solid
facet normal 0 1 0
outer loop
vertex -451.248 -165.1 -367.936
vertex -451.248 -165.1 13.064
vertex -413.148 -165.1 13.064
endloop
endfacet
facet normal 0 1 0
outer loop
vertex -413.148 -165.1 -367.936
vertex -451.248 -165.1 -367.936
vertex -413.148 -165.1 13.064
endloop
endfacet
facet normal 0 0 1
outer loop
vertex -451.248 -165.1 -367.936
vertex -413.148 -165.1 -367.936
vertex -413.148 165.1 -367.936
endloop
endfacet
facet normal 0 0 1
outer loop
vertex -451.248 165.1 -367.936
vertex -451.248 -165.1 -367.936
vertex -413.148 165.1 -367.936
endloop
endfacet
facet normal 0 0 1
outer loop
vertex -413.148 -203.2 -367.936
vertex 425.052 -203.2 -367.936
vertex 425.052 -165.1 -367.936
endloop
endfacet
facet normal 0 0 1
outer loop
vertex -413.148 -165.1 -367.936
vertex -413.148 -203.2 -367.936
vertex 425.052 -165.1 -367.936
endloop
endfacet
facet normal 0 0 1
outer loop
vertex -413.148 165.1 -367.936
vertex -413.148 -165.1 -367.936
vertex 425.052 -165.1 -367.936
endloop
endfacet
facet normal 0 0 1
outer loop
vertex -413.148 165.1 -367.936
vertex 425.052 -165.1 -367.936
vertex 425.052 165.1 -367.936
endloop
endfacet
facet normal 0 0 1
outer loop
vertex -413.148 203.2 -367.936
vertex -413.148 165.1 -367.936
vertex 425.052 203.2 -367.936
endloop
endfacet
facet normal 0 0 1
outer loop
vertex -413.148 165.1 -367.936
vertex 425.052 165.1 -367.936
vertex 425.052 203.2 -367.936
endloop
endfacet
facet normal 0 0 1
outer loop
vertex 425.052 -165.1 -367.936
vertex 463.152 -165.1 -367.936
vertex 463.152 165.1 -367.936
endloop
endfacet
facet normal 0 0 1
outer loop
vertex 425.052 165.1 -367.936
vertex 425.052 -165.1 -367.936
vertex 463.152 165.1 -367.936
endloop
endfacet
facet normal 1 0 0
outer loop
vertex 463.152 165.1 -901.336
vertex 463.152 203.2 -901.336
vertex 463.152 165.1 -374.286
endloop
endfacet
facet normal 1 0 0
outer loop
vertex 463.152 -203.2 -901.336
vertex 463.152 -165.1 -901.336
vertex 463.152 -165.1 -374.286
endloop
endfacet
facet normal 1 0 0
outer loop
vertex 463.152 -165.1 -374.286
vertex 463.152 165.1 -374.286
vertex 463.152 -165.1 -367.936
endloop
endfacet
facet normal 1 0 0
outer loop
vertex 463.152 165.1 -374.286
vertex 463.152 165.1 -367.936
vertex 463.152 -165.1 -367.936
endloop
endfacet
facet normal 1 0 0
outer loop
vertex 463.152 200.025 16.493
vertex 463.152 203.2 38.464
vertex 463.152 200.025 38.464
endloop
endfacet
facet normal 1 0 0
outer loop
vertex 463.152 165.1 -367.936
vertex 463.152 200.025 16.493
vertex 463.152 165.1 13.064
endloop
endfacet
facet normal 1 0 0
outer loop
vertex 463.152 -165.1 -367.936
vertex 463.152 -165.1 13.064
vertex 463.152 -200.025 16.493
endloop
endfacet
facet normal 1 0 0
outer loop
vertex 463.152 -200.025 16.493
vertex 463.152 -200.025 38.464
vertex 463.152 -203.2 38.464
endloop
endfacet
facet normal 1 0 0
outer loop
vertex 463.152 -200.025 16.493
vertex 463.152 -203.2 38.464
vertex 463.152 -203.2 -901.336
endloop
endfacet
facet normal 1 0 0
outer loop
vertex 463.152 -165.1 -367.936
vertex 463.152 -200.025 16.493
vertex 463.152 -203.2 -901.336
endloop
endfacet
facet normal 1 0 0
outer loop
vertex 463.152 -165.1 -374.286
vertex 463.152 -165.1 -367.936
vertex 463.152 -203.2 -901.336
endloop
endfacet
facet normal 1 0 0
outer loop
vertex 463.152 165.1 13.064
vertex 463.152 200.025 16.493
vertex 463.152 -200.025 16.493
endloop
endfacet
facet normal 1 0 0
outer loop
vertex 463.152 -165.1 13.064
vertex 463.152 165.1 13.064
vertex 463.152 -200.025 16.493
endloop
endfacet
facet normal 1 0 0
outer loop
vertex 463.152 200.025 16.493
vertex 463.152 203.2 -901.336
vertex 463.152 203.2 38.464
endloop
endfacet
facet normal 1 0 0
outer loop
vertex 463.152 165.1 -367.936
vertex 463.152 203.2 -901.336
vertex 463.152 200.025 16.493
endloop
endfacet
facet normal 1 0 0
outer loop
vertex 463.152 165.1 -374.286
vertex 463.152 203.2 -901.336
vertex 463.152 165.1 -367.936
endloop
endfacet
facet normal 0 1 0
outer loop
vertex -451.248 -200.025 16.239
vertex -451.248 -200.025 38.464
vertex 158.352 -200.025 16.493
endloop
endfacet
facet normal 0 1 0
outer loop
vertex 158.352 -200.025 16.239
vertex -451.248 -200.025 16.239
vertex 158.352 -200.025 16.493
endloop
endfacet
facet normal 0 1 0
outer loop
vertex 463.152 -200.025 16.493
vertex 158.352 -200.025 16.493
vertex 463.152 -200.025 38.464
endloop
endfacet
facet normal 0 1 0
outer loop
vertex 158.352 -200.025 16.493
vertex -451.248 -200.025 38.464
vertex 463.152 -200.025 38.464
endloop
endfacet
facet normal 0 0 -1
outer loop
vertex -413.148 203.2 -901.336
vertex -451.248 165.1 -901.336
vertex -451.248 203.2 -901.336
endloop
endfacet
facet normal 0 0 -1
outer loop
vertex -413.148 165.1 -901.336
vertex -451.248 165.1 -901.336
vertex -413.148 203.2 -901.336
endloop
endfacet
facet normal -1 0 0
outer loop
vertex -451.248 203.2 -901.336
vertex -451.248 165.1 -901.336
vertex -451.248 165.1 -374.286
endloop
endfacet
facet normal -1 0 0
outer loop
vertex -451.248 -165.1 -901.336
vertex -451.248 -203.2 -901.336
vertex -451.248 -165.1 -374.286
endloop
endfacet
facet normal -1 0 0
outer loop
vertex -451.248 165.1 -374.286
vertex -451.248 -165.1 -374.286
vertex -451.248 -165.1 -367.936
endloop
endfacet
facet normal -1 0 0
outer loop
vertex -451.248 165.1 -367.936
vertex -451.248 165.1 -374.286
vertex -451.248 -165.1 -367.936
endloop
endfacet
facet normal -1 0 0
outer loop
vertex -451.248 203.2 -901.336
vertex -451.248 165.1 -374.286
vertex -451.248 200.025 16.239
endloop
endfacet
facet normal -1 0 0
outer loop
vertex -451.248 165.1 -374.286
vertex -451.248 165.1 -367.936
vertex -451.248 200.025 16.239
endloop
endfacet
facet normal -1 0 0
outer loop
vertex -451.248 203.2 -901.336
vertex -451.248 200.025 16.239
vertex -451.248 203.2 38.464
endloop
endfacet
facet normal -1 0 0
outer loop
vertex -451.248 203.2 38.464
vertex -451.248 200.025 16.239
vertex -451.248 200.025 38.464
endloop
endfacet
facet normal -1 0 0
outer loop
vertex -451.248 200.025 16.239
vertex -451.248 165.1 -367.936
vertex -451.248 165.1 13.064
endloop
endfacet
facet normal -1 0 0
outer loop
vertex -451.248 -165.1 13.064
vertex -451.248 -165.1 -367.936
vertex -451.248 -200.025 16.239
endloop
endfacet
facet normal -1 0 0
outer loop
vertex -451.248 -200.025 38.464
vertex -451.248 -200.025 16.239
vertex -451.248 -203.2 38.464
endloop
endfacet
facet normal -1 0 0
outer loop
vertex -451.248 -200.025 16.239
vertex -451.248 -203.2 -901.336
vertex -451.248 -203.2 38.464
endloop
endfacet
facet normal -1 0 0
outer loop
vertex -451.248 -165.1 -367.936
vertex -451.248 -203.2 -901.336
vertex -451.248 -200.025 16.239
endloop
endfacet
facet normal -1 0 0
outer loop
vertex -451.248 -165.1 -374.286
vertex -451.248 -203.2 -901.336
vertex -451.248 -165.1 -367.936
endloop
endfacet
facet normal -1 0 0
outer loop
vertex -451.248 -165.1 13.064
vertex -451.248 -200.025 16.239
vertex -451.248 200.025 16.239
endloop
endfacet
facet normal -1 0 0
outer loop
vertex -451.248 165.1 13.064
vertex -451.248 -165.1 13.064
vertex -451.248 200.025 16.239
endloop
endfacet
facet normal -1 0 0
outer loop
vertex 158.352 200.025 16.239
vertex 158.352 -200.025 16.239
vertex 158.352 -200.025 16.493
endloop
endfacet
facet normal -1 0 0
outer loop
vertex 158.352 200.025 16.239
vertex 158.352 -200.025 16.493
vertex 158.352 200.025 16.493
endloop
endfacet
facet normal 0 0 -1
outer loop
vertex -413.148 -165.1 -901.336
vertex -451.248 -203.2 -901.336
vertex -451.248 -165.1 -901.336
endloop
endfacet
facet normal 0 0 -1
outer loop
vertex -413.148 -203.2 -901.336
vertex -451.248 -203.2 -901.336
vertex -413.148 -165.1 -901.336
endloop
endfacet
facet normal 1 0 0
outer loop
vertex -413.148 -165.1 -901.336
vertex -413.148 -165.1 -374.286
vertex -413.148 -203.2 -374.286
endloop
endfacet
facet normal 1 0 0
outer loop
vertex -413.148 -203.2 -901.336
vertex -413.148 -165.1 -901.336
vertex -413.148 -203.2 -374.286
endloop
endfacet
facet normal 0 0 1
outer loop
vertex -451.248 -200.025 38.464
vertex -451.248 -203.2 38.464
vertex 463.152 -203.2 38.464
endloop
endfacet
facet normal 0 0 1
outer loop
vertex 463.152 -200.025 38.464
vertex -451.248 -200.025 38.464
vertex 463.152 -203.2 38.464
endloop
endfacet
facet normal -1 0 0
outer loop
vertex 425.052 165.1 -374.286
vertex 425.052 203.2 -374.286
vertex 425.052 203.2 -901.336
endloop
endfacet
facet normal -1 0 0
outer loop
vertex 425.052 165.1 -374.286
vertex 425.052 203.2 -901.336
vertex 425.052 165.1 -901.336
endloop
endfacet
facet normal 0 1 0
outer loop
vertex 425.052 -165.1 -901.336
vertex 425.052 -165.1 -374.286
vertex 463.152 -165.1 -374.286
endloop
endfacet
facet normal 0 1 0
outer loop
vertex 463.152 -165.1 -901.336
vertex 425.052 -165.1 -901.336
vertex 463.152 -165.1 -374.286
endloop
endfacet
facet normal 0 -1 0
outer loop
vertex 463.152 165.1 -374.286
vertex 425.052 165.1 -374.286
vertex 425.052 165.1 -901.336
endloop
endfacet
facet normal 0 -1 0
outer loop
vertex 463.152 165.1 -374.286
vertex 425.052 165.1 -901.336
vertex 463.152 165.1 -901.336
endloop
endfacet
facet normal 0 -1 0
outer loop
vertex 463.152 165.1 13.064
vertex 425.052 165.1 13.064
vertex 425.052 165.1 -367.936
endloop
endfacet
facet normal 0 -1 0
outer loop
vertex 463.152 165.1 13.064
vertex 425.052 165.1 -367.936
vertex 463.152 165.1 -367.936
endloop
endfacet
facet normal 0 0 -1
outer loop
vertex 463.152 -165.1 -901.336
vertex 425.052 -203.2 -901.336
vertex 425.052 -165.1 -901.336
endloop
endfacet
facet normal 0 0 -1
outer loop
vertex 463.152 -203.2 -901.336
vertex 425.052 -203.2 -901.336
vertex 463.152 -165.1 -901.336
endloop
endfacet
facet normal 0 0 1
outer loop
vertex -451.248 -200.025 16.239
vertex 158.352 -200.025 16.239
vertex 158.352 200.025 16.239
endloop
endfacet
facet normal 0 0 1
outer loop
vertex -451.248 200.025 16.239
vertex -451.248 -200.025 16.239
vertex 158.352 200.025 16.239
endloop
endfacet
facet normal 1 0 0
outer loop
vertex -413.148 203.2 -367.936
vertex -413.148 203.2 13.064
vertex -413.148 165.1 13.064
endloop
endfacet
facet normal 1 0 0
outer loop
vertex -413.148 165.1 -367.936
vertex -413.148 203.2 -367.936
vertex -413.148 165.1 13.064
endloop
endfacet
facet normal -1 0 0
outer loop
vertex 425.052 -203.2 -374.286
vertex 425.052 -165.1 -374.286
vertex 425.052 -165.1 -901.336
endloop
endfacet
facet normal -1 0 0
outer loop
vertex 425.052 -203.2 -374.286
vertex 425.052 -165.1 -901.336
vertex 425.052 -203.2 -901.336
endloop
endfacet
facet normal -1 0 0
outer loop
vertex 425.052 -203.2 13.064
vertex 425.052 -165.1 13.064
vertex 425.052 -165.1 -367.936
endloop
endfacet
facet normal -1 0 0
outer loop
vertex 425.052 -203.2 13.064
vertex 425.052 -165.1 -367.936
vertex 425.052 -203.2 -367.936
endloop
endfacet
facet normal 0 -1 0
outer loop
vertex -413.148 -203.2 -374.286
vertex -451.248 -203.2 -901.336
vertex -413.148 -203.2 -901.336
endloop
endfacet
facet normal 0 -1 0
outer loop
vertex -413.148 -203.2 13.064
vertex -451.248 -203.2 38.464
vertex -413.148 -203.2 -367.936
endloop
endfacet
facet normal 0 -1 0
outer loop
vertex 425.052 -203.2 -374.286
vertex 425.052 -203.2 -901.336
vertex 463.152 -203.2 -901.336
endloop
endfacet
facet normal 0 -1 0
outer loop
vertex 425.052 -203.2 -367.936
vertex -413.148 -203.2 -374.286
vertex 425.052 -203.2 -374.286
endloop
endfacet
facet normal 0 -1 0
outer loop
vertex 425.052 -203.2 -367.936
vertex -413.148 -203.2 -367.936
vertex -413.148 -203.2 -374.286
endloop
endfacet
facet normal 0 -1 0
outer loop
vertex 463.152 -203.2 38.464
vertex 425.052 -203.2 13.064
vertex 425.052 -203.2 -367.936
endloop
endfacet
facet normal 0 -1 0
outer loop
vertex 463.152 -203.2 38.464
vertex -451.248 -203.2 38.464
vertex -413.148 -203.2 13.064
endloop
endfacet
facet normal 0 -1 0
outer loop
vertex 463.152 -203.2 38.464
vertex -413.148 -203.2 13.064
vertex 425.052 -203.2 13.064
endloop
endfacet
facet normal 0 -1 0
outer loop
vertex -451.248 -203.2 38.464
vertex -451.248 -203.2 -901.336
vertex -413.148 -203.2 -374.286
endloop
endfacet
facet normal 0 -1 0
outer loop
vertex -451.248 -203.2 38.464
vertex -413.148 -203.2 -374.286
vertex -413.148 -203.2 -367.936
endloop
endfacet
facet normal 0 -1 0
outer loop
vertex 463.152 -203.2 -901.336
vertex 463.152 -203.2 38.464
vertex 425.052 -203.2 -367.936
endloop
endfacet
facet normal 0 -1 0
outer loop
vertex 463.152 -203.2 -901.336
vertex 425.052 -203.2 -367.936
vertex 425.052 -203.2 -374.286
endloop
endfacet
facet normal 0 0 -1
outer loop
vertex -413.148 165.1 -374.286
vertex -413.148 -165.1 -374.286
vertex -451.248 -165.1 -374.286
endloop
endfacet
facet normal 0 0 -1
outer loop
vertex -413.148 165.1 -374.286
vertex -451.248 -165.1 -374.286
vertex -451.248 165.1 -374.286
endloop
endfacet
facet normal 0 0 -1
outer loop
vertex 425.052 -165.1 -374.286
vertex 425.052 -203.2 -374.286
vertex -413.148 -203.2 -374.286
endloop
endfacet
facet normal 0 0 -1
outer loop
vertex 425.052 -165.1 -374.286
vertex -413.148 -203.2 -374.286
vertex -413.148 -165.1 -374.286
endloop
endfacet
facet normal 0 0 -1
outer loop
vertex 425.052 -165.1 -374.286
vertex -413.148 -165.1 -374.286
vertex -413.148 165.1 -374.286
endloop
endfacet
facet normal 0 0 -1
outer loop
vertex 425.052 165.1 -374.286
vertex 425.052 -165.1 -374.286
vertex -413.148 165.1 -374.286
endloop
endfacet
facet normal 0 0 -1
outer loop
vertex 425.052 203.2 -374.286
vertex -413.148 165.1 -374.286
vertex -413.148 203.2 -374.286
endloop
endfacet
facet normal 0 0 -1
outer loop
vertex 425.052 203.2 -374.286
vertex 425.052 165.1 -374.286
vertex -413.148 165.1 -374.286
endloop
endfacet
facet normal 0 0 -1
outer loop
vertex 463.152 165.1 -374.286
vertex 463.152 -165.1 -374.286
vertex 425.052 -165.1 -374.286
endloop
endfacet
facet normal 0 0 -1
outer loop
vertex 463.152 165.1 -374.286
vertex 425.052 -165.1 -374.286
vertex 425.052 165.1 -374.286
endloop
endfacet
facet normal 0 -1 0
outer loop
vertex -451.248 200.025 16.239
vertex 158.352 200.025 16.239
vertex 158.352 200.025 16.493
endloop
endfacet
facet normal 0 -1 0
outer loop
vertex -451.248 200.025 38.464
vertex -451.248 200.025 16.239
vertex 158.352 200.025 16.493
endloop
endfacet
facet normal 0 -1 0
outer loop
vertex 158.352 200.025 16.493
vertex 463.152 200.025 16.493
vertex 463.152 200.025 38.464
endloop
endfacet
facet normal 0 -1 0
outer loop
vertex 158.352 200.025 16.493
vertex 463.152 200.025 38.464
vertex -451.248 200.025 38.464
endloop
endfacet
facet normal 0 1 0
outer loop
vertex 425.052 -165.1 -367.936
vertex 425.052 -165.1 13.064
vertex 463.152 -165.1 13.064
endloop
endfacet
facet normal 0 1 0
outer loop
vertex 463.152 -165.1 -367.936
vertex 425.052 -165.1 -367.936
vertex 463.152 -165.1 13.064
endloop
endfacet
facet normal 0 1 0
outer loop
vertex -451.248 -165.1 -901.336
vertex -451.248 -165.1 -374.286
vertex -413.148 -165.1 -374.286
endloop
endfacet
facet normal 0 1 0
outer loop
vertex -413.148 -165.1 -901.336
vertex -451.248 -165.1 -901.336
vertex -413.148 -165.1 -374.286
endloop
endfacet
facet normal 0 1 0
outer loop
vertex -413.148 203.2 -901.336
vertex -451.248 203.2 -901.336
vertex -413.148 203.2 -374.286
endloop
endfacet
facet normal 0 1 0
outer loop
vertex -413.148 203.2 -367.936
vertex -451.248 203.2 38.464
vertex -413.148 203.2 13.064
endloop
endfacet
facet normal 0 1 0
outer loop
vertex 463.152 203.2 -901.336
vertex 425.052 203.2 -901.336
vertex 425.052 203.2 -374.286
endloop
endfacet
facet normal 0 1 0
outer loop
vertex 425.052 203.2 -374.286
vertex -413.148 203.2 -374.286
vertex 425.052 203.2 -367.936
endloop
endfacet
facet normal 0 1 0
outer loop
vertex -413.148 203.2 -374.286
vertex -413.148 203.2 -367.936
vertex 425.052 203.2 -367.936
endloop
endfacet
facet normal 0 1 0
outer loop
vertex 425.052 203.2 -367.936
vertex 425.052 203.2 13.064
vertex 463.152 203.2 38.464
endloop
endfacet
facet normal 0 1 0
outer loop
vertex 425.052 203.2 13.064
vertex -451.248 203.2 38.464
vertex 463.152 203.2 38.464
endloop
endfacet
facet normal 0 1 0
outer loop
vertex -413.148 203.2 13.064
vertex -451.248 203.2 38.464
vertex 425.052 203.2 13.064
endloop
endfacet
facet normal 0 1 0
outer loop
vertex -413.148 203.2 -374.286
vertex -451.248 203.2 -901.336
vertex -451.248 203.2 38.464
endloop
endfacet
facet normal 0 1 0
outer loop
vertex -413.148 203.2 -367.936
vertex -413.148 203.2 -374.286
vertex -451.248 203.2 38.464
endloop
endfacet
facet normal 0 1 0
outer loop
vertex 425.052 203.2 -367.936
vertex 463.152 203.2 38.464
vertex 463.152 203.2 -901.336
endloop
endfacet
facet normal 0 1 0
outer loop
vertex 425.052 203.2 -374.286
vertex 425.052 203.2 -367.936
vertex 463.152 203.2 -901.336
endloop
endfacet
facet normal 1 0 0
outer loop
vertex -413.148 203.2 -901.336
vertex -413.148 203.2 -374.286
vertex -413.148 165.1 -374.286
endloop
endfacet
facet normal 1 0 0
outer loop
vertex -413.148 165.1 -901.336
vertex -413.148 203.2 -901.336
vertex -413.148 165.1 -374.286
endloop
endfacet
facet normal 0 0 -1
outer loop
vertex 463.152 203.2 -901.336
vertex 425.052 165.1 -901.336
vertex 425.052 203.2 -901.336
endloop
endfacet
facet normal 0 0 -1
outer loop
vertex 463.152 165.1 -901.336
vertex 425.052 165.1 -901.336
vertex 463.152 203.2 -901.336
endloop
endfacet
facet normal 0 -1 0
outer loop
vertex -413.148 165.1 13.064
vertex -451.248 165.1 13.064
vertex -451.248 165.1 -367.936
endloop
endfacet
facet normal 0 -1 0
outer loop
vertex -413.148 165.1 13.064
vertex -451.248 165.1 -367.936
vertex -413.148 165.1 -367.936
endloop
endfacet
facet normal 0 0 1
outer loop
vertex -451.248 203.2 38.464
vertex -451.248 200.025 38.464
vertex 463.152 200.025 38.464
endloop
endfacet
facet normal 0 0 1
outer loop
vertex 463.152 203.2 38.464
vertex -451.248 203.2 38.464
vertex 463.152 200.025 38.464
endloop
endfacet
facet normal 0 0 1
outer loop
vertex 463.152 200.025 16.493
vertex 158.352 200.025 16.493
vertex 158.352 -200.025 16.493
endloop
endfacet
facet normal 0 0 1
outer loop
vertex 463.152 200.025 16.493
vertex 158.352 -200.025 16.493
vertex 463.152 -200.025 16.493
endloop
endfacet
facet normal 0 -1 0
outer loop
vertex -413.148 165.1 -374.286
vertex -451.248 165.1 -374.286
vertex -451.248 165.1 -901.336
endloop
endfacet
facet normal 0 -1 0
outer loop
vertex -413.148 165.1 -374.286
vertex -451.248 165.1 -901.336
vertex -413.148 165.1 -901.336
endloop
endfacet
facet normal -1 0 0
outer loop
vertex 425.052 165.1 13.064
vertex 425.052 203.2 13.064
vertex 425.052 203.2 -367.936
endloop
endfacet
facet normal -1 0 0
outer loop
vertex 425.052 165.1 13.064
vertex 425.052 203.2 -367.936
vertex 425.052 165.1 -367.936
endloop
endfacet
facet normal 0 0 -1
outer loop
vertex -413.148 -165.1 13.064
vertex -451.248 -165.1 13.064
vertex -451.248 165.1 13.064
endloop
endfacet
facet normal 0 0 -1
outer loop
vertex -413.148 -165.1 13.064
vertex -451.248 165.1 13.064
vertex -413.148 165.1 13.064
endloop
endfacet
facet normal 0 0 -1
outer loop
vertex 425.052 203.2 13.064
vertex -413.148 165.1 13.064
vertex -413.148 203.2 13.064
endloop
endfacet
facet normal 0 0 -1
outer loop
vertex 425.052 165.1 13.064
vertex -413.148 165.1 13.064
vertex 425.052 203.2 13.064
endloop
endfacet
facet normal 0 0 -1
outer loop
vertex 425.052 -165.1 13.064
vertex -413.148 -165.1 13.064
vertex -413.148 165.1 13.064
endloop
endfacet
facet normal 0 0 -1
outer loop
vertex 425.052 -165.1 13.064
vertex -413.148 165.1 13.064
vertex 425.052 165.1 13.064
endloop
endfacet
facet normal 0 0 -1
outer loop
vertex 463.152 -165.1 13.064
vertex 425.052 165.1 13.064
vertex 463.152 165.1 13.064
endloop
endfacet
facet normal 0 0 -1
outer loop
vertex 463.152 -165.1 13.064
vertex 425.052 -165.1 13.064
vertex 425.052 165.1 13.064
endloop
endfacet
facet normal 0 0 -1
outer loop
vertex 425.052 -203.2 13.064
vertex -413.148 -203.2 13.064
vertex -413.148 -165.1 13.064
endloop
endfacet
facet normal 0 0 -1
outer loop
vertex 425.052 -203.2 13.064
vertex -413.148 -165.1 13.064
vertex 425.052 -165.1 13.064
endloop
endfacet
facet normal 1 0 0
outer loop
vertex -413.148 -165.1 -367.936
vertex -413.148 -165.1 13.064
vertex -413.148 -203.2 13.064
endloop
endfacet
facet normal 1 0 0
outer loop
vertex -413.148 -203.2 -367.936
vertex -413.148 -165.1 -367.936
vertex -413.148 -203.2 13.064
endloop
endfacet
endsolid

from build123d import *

# Parameters (mm, degrees)
F0_W      = 914.4
F0_H      = 25.4
F1_DEPTH  = 203.2
F2_T      = -3.175
F3_W      = 38.1
F3_H      = 38.1
F4_DEPTH  = 914.4
F5_W      = 406.4
F5_H      = 6.35
F6_DEPTH  = 914.4
F7_DEPTH  = 25.4
F8_DEPTH  = 25.4
F9_W      = 304.8
F9_H      = 400.05
F10_DEPTH = 0.254


with BuildPart() as f1:
    # F0 (on Front) → F1 (new body, symmetric)
    with BuildSketch(Plane.XZ):
        with Locations((5.9522092342, 25.7644668688)):
            Rectangle(F0_W, F0_H)
    extrude(amount=F1_DEPTH, both=True)

    # F2
    f2_openings = [f1.faces().sort_by_distance(p)[0] for p in [
        (5.952209, 0, 38.464467),
    ]]
    offset(amount=F2_T, openings=f2_openings)

    # F3 (on face) → F4 (join)
    with BuildSketch(Plane(origin=(0, 0, 13.0644668688), x_dir=(1, 0, 0), z_dir=(0, 0, -1))):
        with Locations((444.1022092342, 184.15)):
            Rectangle(F3_W, F3_H)
        with Locations((444.1022092342, -184.15)):
            Rectangle(F3_W, F3_H)
        with Locations((-432.1977907658, 184.15)):
            Rectangle(F3_W, F3_H)
        with Locations((-432.1977907658, -184.15)):
            Rectangle(F3_W, F3_H)
    extrude(amount=F4_DEPTH)

    # F5 (on face) → F6 (join, through all)
    with BuildSketch(Plane.YZ.offset(463.1522092342)):
        with Locations((0, -371.1105331312)):
            Rectangle(F5_W, F5_H)
    extrude(amount=-F6_DEPTH)

    # F7 (cut): a face of the model
    f7_faces = [f1.faces().sort_by_distance(p)[0] for p in [
        (-448.0727907658, 0, 27.3519668688),
    ]]
    extrude(f7_faces, amount=-F7_DEPTH, mode=Mode.SUBTRACT)

    # F8 (cut): a face of the model
    f8_faces = [f1.faces().sort_by_distance(p)[0] for p in [
        (459.9772092342, 0, 27.3519668688),
    ]]
    extrude(f8_faces, amount=-F8_DEPTH, mode=Mode.SUBTRACT)

    # F9 (on face) → F10 (join)
    with BuildSketch(Plane.XY.offset(16.2394668688)):
        with Locations((310.7522092342, 0)):
            Rectangle(F9_W, F9_H)
    extrude(amount=F10_DEPTH)


solid = f1.part
